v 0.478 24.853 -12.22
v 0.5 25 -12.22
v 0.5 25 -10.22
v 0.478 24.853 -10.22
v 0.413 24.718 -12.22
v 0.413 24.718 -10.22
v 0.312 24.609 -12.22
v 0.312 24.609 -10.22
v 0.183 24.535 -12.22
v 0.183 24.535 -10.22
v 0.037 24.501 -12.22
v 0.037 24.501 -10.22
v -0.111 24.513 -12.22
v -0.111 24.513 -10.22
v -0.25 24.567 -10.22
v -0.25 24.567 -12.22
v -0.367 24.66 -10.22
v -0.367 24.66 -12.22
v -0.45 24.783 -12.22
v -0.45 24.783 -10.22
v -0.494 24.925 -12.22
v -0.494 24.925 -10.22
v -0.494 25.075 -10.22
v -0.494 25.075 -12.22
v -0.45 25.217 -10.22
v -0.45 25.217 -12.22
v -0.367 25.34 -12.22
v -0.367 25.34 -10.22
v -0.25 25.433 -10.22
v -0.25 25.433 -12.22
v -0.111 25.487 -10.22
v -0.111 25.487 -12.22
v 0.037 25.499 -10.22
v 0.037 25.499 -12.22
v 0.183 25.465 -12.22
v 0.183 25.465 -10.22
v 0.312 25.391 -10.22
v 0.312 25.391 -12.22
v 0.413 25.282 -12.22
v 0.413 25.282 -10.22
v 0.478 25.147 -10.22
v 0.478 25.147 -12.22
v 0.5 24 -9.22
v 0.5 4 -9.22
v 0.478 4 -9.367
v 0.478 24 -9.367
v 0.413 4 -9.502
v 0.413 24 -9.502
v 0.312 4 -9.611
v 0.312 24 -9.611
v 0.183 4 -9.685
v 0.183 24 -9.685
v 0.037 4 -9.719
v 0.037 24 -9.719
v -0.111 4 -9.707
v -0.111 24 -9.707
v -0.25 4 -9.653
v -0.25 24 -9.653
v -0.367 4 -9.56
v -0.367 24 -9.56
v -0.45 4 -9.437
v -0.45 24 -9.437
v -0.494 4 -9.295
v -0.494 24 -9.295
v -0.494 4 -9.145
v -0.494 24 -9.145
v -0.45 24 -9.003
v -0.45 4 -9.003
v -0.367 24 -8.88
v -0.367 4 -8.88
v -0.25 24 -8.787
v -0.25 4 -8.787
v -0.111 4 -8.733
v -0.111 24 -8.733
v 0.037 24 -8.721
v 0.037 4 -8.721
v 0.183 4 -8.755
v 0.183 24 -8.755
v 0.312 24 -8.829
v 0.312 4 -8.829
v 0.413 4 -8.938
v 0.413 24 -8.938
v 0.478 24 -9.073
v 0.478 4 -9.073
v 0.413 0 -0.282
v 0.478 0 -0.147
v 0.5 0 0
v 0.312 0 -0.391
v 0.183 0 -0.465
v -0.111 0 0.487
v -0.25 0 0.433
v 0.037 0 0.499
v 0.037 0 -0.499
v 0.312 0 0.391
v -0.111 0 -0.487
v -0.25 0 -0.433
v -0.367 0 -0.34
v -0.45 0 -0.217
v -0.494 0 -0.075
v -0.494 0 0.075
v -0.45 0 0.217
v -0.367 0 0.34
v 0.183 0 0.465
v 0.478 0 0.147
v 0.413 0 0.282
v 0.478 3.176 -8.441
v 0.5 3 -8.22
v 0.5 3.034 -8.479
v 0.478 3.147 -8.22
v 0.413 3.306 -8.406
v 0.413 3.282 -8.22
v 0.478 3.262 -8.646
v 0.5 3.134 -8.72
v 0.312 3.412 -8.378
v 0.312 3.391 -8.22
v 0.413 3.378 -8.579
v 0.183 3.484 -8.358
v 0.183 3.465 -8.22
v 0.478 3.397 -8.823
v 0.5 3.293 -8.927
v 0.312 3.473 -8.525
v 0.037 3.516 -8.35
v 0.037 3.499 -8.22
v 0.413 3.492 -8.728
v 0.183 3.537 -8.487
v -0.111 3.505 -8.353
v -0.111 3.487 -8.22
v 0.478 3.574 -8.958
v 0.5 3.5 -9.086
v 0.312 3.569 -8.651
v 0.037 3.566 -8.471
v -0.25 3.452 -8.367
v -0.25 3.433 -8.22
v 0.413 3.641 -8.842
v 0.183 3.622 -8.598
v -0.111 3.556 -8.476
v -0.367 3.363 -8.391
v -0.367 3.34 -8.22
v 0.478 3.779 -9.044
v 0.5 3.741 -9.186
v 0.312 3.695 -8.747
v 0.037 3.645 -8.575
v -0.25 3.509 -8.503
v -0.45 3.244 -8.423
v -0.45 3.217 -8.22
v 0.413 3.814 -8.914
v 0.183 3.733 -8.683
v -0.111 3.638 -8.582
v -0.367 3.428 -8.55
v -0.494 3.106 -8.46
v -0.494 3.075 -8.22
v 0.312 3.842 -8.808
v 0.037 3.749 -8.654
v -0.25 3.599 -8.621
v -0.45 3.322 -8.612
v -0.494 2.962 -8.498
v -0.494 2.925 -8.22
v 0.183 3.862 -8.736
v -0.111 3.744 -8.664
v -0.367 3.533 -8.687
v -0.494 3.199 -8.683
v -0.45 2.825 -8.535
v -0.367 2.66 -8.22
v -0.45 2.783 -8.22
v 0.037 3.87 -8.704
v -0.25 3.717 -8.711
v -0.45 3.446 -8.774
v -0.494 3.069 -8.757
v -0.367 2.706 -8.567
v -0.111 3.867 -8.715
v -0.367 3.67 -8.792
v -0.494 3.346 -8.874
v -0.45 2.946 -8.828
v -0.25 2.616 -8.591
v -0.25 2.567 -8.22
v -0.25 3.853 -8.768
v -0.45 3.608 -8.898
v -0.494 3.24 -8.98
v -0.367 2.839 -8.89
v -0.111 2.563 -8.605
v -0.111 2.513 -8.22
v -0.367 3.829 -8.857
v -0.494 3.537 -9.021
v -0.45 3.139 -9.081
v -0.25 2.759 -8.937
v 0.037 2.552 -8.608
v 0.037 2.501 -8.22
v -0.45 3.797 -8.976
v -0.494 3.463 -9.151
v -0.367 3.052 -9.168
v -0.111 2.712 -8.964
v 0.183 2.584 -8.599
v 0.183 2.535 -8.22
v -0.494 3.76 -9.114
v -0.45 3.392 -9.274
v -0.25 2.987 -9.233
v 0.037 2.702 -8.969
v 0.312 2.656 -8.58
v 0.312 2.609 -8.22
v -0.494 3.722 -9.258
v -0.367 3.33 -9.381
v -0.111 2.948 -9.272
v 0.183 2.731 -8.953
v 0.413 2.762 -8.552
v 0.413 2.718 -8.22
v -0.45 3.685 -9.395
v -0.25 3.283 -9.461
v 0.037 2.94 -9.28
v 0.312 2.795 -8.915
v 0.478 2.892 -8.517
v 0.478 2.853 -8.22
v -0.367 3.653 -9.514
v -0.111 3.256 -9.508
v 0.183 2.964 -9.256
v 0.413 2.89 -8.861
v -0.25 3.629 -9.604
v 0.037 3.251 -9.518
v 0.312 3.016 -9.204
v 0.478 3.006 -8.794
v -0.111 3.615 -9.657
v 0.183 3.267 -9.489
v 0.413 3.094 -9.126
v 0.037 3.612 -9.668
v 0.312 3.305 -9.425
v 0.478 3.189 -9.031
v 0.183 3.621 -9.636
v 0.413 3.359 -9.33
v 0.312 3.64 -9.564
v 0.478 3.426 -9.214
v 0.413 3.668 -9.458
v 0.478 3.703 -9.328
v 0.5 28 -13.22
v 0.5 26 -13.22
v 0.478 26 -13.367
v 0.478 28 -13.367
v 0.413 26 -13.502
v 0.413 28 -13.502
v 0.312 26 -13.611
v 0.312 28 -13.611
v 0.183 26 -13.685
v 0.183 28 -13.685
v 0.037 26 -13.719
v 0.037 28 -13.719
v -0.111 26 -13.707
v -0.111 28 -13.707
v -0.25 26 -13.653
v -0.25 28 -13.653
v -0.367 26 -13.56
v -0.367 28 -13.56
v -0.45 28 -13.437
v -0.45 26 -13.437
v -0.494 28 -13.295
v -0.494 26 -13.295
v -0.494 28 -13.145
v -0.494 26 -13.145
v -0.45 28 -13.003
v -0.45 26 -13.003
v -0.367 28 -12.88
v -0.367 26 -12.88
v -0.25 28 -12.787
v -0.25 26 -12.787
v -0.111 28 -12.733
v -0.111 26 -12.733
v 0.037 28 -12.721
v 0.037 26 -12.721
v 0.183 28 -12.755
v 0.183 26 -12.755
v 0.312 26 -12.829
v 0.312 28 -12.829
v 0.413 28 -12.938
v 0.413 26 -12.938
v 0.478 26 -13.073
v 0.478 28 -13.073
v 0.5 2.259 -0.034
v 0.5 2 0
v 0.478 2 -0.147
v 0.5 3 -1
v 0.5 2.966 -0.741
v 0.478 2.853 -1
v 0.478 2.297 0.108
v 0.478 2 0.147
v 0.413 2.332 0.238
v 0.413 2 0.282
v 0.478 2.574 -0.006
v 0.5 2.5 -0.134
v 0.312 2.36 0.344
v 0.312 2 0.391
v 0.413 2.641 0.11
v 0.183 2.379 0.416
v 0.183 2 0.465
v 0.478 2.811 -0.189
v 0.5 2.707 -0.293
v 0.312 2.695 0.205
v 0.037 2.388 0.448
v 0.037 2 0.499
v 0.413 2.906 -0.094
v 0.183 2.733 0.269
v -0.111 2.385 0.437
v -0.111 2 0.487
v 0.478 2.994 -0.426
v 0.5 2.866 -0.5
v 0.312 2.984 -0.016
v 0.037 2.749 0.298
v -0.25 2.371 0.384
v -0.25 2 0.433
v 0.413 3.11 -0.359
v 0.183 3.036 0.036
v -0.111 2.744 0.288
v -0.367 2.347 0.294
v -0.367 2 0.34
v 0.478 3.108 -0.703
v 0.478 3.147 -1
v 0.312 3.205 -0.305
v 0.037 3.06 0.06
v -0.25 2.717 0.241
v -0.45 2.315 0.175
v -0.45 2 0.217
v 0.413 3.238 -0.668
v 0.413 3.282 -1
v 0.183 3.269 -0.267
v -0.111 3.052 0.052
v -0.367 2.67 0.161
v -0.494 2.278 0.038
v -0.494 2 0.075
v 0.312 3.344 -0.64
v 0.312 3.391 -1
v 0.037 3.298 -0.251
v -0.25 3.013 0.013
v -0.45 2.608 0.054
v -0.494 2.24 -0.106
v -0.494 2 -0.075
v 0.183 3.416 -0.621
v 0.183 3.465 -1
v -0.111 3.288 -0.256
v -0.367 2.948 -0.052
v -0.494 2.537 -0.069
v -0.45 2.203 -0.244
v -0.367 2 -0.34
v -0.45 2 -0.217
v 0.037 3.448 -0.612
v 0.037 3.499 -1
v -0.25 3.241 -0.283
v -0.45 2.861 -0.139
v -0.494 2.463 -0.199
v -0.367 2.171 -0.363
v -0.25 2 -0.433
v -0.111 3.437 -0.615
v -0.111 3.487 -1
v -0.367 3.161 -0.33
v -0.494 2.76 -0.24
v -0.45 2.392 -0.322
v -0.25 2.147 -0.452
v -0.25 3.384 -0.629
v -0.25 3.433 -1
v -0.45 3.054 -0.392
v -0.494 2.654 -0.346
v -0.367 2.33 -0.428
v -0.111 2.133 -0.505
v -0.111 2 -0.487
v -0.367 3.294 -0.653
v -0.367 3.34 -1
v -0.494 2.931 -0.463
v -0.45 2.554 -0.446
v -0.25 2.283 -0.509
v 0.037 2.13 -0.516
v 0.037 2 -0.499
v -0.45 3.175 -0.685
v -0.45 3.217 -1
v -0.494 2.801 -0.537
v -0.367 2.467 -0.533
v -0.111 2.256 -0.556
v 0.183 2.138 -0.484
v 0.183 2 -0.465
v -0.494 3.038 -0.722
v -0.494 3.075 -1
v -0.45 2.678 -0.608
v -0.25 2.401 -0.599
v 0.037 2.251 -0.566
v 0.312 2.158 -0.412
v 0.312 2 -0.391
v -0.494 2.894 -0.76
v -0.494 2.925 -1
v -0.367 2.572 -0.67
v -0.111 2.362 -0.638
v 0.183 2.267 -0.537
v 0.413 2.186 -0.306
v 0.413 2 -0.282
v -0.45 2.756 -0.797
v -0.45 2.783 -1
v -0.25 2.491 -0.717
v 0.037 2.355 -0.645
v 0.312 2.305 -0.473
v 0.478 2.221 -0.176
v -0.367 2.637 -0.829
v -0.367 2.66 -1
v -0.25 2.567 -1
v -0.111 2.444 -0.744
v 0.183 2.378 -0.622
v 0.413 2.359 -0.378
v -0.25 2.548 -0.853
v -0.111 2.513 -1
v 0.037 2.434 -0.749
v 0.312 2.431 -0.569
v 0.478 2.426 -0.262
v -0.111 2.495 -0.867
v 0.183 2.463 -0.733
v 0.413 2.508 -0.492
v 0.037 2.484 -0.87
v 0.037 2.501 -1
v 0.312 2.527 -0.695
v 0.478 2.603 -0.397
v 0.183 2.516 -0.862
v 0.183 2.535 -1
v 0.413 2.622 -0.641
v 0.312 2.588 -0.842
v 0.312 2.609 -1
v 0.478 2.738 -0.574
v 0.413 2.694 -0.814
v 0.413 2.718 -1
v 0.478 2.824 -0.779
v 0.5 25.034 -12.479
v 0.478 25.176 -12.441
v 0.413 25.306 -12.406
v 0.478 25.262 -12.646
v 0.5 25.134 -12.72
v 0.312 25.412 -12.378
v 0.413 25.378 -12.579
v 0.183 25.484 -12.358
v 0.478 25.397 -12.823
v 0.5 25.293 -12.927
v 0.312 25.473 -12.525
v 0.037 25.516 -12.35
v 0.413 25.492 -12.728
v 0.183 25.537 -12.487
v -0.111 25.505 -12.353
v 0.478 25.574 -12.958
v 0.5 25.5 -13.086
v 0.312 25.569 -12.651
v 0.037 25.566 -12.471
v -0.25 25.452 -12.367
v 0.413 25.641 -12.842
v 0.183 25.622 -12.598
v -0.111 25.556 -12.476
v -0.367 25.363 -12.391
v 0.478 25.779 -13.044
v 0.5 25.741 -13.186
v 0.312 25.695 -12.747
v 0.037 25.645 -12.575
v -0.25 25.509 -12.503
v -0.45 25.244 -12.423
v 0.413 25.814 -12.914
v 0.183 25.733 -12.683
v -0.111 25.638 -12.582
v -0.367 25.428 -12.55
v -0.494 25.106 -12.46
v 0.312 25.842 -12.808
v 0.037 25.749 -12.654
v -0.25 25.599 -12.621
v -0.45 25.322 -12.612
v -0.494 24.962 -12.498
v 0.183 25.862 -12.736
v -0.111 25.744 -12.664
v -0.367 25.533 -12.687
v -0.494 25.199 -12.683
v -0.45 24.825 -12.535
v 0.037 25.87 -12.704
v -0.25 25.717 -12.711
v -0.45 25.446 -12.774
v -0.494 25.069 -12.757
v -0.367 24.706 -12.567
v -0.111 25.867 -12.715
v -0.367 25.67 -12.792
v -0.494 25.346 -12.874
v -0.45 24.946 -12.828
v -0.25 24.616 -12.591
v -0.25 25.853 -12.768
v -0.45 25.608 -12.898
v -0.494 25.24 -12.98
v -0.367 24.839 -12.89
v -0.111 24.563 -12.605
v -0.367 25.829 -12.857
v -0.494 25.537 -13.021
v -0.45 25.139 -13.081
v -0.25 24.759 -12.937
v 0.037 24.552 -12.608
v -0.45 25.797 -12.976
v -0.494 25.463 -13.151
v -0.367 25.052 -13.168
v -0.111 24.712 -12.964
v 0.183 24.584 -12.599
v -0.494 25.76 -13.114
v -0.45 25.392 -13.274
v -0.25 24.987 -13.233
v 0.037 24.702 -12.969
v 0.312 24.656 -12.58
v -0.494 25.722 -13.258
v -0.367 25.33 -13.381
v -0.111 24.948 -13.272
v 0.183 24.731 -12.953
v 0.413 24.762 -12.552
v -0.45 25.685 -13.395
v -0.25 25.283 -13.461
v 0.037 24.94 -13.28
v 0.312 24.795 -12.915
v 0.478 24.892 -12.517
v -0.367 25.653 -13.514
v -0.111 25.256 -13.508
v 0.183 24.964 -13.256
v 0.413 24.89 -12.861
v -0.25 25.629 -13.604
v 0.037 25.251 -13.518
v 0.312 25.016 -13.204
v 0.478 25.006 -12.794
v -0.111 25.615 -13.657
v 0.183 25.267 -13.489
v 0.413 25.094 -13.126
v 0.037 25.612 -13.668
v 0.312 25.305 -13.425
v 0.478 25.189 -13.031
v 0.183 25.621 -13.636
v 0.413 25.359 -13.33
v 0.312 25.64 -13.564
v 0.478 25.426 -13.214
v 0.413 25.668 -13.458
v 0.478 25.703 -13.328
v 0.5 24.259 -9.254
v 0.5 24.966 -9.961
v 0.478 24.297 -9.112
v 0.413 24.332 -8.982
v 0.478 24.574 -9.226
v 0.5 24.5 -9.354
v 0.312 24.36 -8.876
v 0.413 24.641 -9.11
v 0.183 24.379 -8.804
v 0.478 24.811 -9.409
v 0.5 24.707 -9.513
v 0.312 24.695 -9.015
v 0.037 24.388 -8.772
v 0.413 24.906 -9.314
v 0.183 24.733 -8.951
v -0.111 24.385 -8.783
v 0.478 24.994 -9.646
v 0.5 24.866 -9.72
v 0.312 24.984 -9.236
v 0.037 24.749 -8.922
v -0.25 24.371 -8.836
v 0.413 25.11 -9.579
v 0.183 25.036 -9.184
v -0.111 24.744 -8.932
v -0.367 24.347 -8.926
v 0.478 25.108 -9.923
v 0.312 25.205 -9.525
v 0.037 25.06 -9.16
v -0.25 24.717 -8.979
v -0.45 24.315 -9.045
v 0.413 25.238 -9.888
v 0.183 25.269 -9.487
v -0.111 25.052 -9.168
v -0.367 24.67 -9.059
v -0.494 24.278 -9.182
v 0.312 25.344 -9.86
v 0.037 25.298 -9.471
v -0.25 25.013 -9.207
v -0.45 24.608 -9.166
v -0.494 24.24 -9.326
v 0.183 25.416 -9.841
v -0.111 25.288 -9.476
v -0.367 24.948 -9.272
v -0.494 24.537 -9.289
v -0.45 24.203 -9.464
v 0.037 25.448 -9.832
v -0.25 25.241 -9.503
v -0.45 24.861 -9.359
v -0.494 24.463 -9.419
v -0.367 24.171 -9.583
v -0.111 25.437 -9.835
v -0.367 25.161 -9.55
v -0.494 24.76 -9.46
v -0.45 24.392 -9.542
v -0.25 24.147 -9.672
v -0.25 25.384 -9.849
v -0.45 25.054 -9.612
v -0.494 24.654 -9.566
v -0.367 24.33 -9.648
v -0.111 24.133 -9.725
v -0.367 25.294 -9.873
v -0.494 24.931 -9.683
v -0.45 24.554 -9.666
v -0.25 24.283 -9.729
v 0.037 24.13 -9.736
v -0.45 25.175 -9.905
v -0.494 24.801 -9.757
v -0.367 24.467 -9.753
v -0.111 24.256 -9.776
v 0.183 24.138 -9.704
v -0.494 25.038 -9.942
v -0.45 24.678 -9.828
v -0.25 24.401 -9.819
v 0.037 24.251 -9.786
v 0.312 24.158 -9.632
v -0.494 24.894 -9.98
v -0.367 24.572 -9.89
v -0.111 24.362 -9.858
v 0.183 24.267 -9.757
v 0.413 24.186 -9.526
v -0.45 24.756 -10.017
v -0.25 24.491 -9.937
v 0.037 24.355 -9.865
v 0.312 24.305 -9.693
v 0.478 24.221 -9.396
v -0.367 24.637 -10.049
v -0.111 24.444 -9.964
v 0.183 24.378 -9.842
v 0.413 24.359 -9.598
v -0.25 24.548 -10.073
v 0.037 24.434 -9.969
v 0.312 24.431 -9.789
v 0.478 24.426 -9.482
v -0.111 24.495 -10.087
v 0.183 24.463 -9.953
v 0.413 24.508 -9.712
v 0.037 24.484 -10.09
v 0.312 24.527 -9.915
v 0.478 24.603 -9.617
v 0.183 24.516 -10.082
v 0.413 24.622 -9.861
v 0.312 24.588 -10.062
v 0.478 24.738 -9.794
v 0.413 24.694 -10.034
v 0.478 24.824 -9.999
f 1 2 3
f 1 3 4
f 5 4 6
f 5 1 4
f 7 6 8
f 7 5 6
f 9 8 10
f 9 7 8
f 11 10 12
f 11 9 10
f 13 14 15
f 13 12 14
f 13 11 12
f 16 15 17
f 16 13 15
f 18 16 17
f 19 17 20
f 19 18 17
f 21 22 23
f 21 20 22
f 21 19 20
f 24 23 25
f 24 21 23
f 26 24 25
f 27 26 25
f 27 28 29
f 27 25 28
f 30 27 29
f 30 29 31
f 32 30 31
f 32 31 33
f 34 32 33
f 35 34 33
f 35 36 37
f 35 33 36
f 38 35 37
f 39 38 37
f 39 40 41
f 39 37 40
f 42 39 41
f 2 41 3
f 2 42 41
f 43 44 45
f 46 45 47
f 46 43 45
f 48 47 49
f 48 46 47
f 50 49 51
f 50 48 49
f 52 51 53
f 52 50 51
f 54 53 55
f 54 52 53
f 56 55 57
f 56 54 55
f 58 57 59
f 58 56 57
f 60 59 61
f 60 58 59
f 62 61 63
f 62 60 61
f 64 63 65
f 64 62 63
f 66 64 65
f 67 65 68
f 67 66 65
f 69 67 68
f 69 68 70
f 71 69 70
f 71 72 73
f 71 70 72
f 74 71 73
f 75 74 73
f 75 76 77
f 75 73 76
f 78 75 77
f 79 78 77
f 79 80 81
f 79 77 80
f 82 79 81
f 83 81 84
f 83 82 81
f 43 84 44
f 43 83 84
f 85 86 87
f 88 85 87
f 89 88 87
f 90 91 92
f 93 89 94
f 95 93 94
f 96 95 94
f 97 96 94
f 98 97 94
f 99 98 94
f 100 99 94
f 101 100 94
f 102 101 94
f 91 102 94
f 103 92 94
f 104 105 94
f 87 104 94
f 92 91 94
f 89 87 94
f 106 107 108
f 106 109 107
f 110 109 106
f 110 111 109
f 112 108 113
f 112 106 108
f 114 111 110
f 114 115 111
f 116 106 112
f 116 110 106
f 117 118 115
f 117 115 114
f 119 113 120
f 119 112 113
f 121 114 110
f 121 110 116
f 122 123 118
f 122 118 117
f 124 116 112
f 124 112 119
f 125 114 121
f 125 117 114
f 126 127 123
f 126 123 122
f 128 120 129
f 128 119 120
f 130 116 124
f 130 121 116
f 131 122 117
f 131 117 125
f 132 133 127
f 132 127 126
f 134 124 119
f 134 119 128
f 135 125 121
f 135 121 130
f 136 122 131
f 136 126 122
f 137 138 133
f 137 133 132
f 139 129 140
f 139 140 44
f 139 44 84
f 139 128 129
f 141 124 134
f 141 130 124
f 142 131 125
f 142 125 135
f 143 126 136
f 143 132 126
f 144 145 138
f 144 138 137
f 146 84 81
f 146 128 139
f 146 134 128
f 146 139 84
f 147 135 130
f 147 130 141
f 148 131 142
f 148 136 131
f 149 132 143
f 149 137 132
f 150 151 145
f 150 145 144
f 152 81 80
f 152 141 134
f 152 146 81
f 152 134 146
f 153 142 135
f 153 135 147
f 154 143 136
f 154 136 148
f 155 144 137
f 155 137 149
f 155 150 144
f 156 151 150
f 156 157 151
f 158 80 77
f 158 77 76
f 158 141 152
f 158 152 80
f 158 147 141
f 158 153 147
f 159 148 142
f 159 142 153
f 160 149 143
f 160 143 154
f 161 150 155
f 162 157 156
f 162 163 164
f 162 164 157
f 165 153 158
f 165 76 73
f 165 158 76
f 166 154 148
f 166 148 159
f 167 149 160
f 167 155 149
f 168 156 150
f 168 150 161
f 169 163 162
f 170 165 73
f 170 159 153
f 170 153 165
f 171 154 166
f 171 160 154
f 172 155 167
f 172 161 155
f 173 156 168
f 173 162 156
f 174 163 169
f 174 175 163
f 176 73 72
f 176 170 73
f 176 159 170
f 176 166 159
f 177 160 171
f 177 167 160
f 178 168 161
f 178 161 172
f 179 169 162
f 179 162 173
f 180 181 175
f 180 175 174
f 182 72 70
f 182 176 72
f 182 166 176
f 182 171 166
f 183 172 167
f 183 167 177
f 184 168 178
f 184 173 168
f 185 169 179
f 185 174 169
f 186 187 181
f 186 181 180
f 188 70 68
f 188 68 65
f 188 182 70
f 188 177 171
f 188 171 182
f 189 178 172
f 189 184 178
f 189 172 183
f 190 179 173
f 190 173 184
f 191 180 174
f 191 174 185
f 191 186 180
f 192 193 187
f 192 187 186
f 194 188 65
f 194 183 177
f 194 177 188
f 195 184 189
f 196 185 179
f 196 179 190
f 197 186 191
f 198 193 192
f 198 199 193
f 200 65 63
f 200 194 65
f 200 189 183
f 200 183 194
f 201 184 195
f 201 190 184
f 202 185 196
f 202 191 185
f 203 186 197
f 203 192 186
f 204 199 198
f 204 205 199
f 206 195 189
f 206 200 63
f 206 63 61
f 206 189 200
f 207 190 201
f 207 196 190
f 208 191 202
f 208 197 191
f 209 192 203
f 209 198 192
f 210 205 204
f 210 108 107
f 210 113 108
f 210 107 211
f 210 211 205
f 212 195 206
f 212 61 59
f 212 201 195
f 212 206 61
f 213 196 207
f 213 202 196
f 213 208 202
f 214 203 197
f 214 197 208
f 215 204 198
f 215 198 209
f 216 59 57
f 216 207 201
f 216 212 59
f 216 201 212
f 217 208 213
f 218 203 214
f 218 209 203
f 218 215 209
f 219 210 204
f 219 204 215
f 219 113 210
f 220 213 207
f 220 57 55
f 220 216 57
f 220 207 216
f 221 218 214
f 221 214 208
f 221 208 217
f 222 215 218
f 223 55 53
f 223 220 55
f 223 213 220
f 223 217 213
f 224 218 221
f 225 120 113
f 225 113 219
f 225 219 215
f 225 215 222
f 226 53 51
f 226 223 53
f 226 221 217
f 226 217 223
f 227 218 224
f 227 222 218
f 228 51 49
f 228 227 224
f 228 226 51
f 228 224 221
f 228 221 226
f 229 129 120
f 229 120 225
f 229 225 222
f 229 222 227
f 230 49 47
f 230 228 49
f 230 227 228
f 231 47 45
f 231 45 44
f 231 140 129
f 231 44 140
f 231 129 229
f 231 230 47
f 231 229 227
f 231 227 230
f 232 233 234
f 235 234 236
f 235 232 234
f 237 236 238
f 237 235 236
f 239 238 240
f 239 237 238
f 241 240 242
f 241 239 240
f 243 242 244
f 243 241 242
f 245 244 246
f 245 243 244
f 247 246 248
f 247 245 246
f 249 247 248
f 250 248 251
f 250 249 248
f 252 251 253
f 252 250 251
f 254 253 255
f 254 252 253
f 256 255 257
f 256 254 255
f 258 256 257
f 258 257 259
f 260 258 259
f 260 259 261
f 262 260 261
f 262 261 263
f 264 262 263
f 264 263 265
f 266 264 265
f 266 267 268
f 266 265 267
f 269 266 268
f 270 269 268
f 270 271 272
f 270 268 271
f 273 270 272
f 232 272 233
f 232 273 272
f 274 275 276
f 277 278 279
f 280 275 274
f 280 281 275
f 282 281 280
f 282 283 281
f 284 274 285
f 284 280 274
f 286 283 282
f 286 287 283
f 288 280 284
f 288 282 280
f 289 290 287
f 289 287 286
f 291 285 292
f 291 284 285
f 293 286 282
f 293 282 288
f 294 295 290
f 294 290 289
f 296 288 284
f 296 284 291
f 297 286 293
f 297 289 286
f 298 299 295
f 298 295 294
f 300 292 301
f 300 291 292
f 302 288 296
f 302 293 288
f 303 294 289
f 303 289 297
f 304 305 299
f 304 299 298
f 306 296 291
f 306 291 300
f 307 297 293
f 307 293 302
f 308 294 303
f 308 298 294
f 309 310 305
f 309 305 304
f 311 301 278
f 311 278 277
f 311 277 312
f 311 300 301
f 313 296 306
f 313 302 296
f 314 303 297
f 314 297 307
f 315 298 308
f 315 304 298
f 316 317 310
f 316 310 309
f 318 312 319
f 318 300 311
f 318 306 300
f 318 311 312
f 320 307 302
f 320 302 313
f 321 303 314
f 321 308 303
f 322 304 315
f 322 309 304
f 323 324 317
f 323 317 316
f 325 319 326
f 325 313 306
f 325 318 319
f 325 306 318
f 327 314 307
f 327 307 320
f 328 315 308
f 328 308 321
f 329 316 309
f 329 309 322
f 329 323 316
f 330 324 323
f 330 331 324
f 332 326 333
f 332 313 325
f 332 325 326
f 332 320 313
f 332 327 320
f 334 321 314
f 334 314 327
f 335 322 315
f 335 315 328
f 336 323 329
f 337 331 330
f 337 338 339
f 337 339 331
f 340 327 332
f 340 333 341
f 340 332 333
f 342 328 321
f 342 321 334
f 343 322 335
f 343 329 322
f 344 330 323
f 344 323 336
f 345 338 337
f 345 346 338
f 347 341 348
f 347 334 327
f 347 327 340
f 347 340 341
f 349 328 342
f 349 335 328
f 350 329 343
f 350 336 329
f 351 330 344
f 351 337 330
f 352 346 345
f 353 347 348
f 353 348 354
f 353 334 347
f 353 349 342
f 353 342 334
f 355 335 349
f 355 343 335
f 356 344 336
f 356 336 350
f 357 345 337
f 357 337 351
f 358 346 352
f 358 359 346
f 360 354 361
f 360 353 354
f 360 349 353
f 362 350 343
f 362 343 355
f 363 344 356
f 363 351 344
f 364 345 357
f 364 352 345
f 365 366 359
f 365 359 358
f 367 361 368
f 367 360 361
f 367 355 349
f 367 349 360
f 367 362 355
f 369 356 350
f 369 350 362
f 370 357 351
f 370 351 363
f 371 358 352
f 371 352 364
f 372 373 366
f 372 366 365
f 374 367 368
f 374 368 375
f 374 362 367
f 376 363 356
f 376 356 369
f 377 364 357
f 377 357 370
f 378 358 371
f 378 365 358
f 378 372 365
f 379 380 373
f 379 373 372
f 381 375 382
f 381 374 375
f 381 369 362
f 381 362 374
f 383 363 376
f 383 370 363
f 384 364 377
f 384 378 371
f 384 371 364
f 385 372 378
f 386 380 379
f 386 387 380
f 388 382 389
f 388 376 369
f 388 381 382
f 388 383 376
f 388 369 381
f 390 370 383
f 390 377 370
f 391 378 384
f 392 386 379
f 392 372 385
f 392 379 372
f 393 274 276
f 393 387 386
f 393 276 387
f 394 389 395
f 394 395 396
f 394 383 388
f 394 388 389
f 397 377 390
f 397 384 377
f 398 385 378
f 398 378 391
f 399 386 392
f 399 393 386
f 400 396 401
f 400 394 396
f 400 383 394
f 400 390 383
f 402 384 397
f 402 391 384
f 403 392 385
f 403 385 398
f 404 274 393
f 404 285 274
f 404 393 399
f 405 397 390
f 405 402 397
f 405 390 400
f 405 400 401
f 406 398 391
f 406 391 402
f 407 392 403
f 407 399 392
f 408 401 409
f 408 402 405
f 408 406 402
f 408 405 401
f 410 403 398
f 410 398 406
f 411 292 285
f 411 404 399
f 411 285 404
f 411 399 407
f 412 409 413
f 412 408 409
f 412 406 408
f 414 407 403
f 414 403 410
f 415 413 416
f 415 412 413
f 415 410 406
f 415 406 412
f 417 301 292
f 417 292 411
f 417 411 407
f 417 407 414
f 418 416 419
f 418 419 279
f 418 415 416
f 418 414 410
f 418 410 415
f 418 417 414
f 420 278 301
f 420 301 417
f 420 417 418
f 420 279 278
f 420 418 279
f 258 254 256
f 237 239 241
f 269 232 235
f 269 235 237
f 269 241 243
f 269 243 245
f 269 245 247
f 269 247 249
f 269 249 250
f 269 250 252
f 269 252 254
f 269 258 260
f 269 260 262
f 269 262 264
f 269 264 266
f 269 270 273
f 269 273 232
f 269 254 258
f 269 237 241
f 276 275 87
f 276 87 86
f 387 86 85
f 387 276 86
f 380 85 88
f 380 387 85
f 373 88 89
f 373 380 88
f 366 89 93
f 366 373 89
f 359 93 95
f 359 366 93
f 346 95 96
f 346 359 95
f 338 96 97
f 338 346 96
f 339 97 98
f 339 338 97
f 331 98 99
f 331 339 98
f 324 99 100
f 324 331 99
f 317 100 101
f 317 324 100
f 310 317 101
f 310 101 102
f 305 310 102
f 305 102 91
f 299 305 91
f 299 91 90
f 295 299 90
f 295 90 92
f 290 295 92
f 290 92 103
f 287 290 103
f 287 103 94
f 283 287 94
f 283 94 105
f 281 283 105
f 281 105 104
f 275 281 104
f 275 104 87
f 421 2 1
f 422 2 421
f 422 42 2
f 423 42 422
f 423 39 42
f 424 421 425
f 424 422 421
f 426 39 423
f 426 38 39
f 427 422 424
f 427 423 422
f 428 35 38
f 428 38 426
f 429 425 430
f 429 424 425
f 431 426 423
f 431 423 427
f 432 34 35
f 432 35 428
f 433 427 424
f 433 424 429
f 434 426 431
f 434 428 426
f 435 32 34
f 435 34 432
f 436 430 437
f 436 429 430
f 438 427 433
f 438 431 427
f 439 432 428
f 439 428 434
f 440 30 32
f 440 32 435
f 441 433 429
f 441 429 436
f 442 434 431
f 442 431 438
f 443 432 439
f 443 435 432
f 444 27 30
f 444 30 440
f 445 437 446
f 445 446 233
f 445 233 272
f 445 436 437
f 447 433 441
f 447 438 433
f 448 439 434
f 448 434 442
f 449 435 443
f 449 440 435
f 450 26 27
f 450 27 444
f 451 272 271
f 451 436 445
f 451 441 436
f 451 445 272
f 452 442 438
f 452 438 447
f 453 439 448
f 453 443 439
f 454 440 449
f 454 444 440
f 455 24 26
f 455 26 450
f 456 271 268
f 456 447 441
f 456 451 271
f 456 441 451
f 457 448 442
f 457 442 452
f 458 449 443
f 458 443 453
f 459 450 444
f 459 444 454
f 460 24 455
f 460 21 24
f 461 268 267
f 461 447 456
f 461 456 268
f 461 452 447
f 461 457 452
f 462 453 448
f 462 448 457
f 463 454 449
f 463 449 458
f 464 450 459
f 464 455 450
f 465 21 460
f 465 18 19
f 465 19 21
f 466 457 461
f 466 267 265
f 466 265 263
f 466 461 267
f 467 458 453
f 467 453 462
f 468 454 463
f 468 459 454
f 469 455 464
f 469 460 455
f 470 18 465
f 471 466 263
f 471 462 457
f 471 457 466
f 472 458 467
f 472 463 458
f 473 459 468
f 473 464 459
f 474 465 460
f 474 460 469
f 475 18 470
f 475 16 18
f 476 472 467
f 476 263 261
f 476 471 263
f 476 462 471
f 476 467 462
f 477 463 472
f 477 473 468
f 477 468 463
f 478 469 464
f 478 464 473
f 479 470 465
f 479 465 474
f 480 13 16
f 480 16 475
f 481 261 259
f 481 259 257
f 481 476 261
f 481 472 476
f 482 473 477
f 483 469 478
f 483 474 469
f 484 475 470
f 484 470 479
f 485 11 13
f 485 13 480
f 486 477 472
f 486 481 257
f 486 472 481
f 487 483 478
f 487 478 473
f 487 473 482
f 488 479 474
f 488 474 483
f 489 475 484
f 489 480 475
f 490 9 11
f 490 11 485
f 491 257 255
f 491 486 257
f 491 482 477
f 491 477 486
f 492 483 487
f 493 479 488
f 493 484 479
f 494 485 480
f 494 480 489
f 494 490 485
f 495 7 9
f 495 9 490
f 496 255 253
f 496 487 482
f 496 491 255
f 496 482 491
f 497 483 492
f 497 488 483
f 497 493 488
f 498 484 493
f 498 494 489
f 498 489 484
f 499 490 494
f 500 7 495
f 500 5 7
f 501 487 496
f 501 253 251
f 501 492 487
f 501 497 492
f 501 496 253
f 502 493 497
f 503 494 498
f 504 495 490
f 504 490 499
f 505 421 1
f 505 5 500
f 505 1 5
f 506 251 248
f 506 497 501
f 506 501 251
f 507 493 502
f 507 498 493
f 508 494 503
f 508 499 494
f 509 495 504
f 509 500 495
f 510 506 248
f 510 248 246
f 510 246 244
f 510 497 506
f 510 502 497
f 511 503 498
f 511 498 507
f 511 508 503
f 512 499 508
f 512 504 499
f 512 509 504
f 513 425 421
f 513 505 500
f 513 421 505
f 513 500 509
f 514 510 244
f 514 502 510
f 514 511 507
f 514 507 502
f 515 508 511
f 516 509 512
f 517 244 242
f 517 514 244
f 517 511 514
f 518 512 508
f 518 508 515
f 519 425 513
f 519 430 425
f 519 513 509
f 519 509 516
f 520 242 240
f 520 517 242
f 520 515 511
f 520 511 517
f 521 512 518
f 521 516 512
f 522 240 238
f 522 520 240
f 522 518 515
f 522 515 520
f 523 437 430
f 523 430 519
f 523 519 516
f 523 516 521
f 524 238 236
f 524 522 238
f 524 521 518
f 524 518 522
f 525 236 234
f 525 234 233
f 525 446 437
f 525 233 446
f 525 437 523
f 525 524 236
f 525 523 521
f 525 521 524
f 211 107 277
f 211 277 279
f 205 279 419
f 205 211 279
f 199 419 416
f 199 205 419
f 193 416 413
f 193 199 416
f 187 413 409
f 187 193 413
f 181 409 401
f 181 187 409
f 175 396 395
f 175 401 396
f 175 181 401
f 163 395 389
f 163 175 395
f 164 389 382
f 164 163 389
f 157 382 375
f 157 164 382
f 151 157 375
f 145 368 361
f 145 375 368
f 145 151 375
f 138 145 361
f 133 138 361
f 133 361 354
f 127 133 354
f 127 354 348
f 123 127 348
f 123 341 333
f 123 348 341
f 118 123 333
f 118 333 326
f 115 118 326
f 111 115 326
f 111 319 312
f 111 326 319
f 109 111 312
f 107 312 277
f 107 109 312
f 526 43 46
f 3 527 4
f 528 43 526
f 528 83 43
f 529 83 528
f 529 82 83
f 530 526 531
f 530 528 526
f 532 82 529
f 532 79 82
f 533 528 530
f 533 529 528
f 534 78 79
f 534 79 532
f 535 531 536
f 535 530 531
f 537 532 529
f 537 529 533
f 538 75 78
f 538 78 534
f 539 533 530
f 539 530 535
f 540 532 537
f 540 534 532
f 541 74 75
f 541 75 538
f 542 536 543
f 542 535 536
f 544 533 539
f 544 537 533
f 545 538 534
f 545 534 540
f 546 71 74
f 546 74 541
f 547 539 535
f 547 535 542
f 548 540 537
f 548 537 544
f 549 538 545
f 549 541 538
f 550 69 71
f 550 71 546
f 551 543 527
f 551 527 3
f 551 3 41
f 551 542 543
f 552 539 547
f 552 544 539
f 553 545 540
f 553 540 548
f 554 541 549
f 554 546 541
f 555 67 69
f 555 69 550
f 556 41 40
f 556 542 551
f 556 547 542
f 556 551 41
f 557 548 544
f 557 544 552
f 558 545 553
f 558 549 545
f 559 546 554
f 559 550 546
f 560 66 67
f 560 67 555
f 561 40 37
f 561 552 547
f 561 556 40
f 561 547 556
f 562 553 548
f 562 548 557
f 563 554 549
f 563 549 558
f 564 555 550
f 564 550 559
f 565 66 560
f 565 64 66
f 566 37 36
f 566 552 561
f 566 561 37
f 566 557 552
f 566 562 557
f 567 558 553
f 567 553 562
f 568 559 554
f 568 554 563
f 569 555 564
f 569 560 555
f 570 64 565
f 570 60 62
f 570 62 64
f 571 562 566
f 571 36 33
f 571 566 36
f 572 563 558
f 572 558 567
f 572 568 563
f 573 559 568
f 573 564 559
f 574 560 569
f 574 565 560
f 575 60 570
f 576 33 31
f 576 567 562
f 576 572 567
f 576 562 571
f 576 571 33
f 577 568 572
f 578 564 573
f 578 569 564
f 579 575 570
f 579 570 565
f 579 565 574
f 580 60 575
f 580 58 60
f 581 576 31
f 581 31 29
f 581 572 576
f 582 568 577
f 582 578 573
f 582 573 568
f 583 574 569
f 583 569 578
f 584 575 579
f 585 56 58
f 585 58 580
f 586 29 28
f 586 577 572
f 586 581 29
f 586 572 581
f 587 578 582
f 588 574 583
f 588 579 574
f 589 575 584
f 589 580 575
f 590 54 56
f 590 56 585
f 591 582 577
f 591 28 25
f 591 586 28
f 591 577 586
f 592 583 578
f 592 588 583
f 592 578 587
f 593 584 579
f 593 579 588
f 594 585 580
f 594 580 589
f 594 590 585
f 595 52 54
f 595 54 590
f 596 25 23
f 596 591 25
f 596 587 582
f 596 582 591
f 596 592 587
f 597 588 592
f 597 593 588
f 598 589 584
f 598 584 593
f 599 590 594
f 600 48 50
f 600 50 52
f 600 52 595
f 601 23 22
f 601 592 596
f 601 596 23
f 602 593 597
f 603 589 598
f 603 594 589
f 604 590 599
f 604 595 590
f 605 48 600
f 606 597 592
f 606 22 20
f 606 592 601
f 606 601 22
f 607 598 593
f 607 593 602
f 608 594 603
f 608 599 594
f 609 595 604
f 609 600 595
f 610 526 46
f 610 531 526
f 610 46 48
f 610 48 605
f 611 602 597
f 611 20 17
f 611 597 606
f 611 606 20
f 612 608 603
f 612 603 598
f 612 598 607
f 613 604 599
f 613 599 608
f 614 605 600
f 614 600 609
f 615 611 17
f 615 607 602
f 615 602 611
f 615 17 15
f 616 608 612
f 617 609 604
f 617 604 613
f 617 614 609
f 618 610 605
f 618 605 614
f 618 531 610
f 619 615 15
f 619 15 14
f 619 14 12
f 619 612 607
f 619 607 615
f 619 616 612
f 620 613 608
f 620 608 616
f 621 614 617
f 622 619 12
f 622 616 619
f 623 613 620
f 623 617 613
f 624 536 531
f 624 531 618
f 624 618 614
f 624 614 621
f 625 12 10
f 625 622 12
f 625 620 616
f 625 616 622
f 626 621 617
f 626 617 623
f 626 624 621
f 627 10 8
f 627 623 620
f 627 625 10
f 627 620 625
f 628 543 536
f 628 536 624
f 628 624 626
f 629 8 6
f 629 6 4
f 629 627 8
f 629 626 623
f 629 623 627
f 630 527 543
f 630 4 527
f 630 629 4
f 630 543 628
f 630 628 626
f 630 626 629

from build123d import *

# Parameters (mm, degrees)
SKETCH2_R = 0.5


with BuildPart() as part:
    # Sweep1: sweep along a path in Sketch1
    with BuildLine(Plane(origin=(0, 0, 0), x_dir=(0, 0, -1), z_dir=(1, 0, 0))) as sweep1_path:
        Line((0, 0), (0, 2))
        ThreePointArc((0, 2), (0.292893219, 2.707106781), (1, 3))
        Line((1, 3), (8.22, 3))
        ThreePointArc((8.22, 3), (8.927106781, 3.292893219), (9.22, 4))
        Line((9.22, 4), (9.22, 24))
        ThreePointArc((9.22, 24), (9.512893219, 24.707106781), (10.22, 25))
        Line((10.22, 25), (12.22, 25))
        ThreePointArc((12.22, 25), (12.927106781, 25.292893219), (13.22, 26))
        Line((13.22, 26), (13.22, 28))
    # Sketch2 → Sweep1 (sweep)
    with BuildSketch(Plane(origin=(0, 0, 0), x_dir=(1, 0, 0), z_dir=(0, 1, 0))):
        Circle(SKETCH2_R)
    sweep(path=sweep1_path.line)


solid = part.part
